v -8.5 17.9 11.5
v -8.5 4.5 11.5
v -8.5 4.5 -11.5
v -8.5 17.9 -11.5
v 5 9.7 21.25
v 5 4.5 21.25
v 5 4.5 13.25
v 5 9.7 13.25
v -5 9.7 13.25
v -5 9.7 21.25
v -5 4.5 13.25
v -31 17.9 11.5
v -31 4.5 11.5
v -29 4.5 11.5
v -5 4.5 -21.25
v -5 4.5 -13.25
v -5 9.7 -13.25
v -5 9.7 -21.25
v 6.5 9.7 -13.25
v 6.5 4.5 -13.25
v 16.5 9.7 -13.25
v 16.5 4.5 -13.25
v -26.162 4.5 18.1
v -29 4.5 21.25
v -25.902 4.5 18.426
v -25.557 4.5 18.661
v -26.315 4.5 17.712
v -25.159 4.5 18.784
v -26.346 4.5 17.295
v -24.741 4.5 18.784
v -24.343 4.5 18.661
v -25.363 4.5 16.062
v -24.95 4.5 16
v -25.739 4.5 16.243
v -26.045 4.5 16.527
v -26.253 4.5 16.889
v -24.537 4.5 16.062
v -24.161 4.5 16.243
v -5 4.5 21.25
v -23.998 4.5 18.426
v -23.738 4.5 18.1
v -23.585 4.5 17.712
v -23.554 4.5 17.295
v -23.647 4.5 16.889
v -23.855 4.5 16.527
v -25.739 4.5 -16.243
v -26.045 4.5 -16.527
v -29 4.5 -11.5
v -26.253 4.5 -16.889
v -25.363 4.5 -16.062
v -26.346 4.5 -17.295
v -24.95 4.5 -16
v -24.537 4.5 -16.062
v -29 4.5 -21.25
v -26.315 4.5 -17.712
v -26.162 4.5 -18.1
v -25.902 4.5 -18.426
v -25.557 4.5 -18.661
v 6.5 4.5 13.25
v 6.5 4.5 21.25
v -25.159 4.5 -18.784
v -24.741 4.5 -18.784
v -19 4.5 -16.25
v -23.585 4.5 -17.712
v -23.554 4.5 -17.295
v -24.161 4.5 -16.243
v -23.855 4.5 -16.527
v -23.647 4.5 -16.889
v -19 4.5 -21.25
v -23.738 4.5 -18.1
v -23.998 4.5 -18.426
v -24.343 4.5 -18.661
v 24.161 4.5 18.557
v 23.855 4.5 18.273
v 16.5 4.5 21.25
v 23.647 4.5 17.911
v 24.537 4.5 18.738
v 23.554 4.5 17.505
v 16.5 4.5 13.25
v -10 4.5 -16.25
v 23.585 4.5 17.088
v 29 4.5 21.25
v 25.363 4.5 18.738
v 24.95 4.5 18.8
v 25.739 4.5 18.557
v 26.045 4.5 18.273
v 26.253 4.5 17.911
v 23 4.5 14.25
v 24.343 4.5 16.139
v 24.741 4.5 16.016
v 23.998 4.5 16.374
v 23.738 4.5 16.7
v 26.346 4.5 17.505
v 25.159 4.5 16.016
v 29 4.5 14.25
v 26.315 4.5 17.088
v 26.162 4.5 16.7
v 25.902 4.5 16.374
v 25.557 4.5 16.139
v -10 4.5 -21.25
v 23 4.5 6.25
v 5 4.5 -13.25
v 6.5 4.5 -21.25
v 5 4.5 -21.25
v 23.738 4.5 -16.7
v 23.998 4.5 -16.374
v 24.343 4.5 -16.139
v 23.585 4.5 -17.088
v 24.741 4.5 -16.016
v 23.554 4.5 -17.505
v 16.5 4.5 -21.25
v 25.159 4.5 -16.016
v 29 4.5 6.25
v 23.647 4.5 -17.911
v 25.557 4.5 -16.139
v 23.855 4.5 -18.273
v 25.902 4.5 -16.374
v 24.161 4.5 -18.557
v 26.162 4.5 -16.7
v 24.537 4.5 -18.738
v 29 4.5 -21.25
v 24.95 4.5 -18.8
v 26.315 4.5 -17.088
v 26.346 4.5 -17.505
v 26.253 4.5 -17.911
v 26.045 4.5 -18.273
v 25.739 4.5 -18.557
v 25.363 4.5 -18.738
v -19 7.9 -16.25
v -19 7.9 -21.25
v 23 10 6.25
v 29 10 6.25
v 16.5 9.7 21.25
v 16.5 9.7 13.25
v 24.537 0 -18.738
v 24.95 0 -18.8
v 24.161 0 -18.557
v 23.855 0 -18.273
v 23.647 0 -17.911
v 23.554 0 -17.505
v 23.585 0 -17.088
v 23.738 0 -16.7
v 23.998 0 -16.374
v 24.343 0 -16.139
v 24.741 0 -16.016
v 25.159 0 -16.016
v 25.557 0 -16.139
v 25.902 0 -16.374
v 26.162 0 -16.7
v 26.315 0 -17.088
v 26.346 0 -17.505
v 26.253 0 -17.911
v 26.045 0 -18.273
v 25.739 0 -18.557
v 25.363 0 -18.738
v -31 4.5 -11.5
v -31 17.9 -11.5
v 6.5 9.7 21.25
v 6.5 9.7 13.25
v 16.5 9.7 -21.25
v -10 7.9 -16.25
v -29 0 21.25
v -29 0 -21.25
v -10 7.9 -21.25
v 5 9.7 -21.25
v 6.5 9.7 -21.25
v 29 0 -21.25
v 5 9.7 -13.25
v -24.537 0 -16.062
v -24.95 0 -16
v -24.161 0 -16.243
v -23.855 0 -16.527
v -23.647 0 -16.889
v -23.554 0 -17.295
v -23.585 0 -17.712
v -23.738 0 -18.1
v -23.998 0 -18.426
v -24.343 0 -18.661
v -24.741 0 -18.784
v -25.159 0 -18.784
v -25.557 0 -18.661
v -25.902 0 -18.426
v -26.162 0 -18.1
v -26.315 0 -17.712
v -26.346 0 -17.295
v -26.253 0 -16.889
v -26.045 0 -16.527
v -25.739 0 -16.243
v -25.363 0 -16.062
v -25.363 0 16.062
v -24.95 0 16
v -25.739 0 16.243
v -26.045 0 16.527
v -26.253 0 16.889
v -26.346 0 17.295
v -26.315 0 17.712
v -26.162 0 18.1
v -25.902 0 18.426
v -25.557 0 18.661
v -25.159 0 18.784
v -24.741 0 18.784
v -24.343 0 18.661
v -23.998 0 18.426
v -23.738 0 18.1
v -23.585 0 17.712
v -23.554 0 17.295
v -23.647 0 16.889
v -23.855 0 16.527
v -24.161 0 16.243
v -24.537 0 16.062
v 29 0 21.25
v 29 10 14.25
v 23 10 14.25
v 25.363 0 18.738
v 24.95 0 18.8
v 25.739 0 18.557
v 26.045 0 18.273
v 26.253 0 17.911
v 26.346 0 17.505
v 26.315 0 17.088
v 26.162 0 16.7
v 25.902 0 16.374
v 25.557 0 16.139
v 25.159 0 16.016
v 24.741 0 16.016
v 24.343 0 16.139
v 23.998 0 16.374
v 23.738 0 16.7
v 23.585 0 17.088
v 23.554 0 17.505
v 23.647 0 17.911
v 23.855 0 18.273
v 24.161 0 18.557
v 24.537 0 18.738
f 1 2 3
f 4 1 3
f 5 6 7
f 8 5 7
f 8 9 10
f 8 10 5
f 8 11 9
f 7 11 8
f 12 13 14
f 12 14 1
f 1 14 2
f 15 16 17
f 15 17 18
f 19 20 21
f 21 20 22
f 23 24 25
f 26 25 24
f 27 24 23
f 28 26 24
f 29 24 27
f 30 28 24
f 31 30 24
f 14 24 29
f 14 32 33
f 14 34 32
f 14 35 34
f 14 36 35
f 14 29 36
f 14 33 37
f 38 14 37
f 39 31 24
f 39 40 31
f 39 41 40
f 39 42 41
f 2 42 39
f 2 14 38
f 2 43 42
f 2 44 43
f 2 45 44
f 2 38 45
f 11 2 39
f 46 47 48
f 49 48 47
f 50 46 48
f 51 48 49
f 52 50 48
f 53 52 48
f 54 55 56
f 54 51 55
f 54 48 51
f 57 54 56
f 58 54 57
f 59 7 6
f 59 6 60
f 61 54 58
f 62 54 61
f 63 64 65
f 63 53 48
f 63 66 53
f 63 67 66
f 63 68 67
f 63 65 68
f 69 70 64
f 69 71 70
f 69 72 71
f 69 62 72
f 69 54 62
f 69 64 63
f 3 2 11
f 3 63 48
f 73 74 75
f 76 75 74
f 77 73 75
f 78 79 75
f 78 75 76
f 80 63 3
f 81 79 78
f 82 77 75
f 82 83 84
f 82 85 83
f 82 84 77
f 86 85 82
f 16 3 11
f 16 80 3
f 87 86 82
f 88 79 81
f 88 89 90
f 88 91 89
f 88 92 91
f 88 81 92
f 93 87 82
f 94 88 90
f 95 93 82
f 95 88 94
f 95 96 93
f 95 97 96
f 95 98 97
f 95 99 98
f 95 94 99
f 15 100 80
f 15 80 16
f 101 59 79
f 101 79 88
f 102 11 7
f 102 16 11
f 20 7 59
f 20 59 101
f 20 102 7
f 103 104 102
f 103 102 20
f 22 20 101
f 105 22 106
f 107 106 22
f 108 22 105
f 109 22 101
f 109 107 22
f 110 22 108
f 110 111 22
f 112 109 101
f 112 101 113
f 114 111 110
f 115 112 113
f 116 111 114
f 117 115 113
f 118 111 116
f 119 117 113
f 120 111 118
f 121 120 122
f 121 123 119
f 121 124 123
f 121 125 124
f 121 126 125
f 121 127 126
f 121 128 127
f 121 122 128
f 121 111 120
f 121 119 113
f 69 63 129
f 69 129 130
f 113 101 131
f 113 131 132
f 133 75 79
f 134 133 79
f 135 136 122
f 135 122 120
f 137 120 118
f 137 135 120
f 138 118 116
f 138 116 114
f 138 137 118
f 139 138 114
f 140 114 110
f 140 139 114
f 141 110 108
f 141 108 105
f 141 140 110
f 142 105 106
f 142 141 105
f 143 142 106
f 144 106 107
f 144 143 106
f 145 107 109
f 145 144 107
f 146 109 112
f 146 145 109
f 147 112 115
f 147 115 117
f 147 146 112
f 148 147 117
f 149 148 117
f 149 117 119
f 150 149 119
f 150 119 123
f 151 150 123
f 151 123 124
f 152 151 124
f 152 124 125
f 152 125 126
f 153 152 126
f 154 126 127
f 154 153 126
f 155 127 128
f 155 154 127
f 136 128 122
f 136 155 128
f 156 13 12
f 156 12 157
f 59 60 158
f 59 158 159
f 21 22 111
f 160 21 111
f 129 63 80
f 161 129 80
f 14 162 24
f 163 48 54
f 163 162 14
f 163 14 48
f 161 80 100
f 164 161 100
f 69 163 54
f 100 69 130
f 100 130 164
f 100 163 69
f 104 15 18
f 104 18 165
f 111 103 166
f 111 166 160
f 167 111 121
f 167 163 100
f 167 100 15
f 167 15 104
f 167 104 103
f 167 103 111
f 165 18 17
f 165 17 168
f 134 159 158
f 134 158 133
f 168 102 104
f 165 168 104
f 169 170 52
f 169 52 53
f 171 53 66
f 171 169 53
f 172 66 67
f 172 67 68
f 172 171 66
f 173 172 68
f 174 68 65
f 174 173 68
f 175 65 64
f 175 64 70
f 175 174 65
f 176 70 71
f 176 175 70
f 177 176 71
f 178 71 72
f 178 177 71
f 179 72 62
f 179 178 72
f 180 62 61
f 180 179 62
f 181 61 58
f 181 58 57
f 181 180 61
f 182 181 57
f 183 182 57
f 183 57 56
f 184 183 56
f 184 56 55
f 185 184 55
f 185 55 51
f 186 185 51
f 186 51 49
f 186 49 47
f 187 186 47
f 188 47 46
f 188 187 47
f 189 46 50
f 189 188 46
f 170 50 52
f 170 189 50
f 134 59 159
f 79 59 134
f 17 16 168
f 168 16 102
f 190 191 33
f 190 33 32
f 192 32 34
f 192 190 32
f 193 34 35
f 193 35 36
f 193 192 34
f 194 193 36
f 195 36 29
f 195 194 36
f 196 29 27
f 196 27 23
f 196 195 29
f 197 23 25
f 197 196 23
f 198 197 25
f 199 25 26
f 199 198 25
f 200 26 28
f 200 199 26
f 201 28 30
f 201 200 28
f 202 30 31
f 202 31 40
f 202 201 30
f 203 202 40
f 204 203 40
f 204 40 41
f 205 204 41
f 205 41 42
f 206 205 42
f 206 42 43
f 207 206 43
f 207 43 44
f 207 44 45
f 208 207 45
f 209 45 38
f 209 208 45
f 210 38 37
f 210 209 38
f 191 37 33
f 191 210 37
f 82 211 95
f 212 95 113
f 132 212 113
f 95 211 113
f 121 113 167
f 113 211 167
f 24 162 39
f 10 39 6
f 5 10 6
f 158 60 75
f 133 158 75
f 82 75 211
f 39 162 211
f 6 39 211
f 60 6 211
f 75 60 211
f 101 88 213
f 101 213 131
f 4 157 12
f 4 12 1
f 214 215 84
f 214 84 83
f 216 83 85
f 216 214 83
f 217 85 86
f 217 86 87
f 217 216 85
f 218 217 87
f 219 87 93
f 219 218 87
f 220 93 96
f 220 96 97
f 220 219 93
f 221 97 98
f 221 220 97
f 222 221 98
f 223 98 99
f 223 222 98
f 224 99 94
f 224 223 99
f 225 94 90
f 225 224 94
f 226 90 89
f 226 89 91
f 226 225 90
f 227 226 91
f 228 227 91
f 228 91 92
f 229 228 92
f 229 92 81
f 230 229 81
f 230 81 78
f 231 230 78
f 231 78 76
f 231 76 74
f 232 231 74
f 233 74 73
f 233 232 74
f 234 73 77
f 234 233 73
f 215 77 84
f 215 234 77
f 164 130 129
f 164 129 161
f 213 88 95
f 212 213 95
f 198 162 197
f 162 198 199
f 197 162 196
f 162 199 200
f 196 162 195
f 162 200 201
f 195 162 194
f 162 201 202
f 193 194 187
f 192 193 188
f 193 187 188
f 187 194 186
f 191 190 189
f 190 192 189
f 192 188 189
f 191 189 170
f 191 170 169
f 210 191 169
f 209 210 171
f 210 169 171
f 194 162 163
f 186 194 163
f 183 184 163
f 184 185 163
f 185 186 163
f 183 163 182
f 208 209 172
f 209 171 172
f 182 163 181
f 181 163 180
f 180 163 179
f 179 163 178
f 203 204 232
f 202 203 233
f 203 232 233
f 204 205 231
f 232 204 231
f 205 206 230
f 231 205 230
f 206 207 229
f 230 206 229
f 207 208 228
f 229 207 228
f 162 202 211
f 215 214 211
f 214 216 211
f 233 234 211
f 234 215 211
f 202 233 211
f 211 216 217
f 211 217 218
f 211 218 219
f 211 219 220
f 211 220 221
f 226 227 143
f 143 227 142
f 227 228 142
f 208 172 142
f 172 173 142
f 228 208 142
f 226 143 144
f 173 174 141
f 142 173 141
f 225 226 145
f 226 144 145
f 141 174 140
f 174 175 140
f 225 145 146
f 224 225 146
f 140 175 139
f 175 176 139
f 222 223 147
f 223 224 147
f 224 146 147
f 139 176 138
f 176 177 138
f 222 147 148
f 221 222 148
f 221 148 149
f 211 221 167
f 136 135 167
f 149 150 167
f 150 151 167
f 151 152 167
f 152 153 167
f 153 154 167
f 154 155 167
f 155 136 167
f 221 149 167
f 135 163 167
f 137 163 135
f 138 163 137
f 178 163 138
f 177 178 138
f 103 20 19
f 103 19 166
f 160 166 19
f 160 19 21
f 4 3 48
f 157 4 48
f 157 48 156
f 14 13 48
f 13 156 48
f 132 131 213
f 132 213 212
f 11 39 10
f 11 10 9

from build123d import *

# Parameters (mm, degrees)
SKETCH1_W           = 58
SKETCH1_H           = 42.5
SKETCH1_R           = 1.4
BOSS_EXTRUDE1_DEPTH = 4.5
SKETCH2_W           = 22.5
SKETCH2_H           = 23
BOSS_EXTRUDE2_DEPTH = 13.4
SKETCH2_3_W         = 10
SKETCH2_3_H         = 8
BOSS_EXTRUDE3_DEPTH = 5.2
SKETCH2_4_W         = 6
SKETCH2_4_H         = 8
BOSS_EXTRUDE4_DEPTH = 5.5
SKETCH2_5_W         = 9
SKETCH2_5_H         = 5
BOSS_EXTRUDE5_DEPTH = 3.4


with BuildPart() as part:
    # Sketch1 → Boss-Extrude1 (new body)
    with BuildSketch(Plane(origin=(0, 0, 0), x_dir=(1, 0, 0), z_dir=(0, 1, 0))):
        Rectangle(SKETCH1_W, SKETCH1_H)
        with Locations((-24.95, 17.4)):
            Circle(SKETCH1_R, mode=Mode.SUBTRACT)
        with Locations((24.95, 17.4)):
            Circle(SKETCH1_R, mode=Mode.SUBTRACT)
        with Locations((24.95, -17.4)):
            Circle(SKETCH1_R, mode=Mode.SUBTRACT)
        with Locations((-24.95, -17.4)):
            Circle(SKETCH1_R, mode=Mode.SUBTRACT)
    extrude(amount=BOSS_EXTRUDE1_DEPTH)

    # Sketch2 → Boss-Extrude2 (add)
    with BuildSketch(Plane(origin=(0, 4.5, 0), x_dir=(1, 0, 0), z_dir=(0, 1, 0))):
        with Locations((-19.75, 0)):
            Rectangle(SKETCH2_W, SKETCH2_H)
    extrude(amount=BOSS_EXTRUDE2_DEPTH)

    # Sketch2<3> → Boss-Extrude3 (add)
    with BuildSketch(Plane(origin=(0, 4.5, 0), x_dir=(1, 0, 0), z_dir=(0, 1, 0))):
        with Locations((11.5, 17.25)):
            Rectangle(SKETCH2_3_W, SKETCH2_3_H)
        with Locations((0, 17.25)):
            Rectangle(SKETCH2_3_W, SKETCH2_3_H)
        with Locations((0, -17.25)):
            Rectangle(SKETCH2_3_W, SKETCH2_3_H)
        with Locations((11.5, -17.25)):
            Rectangle(SKETCH2_3_W, SKETCH2_3_H)
    extrude(amount=BOSS_EXTRUDE3_DEPTH)

    # Sketch2<4> → Boss-Extrude4 (add)
    with BuildSketch(Plane(origin=(0, 4.5, 0), x_dir=(1, 0, 0), z_dir=(0, 1, 0))):
        with Locations((26, -10.25)):
            Rectangle(SKETCH2_4_W, SKETCH2_4_H)
    extrude(amount=BOSS_EXTRUDE4_DEPTH)

    # Sketch2<5> → Boss-Extrude5 (add)
    with BuildSketch(Plane(origin=(0, 4.5, 0), x_dir=(1, 0, 0), z_dir=(0, 1, 0))):
        with Locations((-14.5, 18.75)):
            Rectangle(SKETCH2_5_W, SKETCH2_5_H)
    extrude(amount=BOSS_EXTRUDE5_DEPTH)


solid = part.part
